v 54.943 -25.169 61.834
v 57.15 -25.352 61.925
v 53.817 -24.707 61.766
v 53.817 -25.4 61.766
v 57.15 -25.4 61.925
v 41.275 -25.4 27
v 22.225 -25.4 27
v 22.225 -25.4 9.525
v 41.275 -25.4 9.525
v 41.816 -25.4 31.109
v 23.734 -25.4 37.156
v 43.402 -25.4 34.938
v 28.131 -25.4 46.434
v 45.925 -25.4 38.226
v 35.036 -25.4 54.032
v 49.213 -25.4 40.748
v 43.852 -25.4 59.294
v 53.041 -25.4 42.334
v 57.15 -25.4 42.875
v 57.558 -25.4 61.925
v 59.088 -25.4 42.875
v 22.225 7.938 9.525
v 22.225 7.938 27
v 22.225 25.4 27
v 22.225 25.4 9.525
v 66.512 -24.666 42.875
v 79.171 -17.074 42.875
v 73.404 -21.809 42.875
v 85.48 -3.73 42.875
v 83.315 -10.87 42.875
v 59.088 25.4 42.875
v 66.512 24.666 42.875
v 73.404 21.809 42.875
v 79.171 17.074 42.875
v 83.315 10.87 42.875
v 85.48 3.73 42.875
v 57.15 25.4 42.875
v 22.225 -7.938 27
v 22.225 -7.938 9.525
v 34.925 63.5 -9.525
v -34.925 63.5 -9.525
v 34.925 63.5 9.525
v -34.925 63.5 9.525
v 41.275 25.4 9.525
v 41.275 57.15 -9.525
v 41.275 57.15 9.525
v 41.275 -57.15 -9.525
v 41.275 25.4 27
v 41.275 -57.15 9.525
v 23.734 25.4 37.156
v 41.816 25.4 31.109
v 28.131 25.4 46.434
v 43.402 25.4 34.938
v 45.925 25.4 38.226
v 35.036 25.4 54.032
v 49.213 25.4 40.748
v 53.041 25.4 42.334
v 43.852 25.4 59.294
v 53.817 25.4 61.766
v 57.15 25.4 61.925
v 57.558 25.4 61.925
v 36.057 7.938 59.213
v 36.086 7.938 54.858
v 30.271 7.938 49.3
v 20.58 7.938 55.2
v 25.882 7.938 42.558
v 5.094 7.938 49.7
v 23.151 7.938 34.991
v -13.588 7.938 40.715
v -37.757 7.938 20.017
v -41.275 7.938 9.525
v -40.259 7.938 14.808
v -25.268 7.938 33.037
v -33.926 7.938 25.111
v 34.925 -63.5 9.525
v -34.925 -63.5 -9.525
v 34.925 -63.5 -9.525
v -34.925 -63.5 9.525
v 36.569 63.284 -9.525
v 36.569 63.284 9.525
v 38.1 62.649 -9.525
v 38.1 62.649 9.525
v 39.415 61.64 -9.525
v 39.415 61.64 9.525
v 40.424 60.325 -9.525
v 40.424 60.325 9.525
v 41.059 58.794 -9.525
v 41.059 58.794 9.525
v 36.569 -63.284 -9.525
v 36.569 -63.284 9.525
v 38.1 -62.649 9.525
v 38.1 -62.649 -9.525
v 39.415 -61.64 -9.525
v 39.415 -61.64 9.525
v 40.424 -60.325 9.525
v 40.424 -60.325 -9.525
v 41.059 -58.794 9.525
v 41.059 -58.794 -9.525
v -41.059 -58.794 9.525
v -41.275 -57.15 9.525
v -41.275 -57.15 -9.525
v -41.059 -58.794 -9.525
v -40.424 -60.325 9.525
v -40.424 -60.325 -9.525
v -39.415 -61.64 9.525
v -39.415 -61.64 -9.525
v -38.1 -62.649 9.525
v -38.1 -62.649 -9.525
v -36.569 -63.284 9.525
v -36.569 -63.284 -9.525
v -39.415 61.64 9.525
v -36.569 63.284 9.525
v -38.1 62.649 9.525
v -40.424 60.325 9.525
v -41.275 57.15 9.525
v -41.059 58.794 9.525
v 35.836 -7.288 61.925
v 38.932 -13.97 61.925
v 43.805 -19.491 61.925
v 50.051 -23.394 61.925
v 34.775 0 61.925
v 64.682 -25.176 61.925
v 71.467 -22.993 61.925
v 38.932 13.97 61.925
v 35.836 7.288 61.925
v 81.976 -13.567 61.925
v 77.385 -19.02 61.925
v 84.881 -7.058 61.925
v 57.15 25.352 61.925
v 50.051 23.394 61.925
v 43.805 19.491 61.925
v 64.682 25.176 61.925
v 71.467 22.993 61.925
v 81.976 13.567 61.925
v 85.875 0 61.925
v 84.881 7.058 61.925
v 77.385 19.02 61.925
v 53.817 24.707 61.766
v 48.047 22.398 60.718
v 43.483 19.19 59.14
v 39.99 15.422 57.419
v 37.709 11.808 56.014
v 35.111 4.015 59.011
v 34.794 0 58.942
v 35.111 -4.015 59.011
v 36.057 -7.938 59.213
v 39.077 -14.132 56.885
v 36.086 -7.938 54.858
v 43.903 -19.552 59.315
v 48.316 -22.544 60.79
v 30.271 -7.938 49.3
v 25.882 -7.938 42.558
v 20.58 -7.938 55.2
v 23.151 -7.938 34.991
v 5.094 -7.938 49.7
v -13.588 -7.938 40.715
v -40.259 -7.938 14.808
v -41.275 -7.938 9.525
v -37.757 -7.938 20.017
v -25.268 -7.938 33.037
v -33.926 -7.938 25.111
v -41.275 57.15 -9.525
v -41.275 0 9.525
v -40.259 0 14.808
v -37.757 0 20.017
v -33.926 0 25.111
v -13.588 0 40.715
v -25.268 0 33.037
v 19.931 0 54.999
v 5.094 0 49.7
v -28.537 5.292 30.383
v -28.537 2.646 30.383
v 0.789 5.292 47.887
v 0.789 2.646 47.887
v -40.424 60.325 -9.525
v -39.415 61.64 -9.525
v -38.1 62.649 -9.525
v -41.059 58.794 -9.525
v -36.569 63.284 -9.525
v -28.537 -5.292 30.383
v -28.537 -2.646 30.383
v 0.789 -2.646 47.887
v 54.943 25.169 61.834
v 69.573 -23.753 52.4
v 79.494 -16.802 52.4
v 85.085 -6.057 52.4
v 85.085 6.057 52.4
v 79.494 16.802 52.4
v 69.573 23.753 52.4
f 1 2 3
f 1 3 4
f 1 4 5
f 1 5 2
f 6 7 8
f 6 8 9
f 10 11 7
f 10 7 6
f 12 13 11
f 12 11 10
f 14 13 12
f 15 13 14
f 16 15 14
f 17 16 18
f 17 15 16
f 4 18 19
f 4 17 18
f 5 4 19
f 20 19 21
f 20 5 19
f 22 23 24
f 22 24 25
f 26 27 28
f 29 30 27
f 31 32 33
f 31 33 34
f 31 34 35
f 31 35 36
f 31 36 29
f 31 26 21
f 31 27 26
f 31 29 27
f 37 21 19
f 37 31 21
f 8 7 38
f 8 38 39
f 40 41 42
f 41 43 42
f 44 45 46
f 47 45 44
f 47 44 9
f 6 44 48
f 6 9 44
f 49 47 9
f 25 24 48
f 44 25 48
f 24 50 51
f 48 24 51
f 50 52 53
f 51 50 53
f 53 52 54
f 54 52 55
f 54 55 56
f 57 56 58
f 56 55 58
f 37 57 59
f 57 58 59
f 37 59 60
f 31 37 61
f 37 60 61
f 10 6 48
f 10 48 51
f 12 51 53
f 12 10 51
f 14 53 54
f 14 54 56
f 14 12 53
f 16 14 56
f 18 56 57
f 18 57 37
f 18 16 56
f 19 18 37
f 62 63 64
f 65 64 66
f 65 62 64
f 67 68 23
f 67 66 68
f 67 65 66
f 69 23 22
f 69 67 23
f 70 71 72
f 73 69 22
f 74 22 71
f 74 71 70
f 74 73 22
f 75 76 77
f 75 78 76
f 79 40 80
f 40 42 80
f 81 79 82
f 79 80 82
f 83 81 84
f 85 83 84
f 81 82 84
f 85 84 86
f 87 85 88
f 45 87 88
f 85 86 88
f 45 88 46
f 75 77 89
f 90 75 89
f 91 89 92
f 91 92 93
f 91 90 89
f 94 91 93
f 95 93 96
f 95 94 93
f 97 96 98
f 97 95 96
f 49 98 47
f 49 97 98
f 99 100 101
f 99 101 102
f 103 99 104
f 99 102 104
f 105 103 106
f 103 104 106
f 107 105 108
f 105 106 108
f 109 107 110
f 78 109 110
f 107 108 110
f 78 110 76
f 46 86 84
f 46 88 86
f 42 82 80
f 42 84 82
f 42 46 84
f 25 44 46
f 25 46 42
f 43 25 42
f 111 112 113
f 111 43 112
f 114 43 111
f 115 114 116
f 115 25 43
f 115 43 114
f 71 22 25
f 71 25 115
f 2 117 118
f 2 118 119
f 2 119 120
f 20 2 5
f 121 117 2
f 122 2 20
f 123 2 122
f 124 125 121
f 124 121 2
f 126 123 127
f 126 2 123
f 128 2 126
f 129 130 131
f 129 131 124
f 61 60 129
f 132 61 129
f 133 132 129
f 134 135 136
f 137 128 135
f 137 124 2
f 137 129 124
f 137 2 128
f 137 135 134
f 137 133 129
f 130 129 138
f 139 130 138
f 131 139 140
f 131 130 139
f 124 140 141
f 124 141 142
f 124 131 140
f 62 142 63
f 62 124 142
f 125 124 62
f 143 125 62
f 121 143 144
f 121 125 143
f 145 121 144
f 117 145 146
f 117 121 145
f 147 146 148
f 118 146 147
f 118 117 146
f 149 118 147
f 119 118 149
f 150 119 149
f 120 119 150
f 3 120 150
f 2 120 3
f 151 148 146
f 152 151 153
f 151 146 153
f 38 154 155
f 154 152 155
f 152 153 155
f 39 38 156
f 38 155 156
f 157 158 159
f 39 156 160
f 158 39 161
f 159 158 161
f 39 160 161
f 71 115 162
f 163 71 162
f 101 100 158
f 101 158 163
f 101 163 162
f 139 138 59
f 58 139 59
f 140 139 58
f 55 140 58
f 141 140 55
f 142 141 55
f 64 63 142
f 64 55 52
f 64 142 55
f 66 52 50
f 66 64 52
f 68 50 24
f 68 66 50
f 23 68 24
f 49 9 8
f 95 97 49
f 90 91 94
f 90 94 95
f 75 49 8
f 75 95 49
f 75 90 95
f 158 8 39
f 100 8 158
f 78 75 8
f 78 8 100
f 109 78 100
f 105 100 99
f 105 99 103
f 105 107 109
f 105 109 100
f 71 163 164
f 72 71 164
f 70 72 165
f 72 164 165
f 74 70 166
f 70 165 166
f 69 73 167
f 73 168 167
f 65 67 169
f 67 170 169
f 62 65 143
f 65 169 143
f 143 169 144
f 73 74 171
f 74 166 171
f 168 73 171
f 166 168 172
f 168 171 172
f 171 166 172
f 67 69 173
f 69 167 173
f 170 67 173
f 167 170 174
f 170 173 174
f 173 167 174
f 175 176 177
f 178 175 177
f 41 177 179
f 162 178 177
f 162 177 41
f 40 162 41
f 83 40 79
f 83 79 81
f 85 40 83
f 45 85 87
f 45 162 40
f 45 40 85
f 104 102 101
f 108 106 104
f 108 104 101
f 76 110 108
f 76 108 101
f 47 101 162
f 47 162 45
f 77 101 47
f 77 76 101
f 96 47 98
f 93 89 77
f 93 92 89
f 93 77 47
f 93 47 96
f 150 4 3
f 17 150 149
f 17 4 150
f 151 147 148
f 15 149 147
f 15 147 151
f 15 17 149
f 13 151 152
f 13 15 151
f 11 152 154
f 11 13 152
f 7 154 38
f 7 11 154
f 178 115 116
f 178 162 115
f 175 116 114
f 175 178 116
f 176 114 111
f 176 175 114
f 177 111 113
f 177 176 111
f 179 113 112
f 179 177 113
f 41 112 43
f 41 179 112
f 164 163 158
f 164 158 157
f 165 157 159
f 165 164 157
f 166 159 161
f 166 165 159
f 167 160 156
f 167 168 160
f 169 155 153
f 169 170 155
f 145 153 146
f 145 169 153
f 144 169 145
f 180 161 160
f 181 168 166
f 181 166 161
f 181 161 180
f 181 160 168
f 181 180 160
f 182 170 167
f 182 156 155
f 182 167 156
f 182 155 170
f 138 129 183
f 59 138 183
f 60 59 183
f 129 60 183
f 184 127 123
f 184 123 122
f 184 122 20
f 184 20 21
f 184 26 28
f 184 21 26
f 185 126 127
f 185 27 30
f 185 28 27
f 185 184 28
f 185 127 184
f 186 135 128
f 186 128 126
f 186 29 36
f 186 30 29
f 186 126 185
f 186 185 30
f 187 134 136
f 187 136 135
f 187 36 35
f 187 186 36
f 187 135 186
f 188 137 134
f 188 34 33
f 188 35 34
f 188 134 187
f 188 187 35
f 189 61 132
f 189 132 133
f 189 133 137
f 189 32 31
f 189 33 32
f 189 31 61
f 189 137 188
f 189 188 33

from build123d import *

# Parameters (mm, degrees)
F1_DEPTH = 63.5
F2_DEPTH = 25.4
F3_DEPTH = 7.9375
F4_R     = 6.35


with BuildPart() as f1:
    # F0 (on Front) → F1 (new body, symmetric)
    with BuildSketch(Plane.XZ):
        Polygon((-41.275, -9.525), (41.275, -9.525), (41.275, 9.525), (22.225, 9.525), (-41.275, 9.525), align=None)
    extrude(amount=F1_DEPTH, both=True)

    # F0 (on Front) → F2 (join, symmetric)
    with BuildSketch(Plane.XZ):
        with BuildLine():
            Line((22.225, 9.525), (41.275, 9.525))
            Line((41.275, 9.525), (41.275, 27.0002))
            ThreePointArc((41.275, 27.0002), (45.9246798487, 38.2255201513), (57.15, 42.8752))
            Line((57.15, 42.8752), (60.325, 42.8752))
            Line((60.325, 42.8752), (60.325, 61.9252))
            Line((60.325, 61.9252), (57.15, 61.9252))
            add(Edge.make_bspline(
                [(53.8173720822, 61.7658326875), (54.9505591394, 61.8408261866), (56.0622461787, 61.8941638054), (57.15, 61.9252)],
                knots=[108.1113735744, 108.1113735744, 108.1113735744, 108.1113735744, 111.5045361635, 111.5045361635, 111.5045361635, 111.5045361635], degree=3))
            ThreePointArc((53.8173720822, 61.7658326875), (31.3028758367, 50.4881074735), (22.225, 27.0002))
            Line((22.225, 27.0002), (22.225, 9.525))
        make_face()
    extrude(amount=F2_DEPTH, both=True)

    # F0 (on Front) → F3 (join, symmetric)
    with BuildSketch(Plane.XZ):
        with BuildLine():
            add(Edge.make_bspline(
                [(-41.275, 9.525), (-40.218694031, 35.0028870222), (17.7122913335, 59.3764245807), (53.8173720822, 61.7658326875)],
                knots=[0, 0, 0, 0, 108.1113735744, 108.1113735744, 108.1113735744, 108.1113735744], degree=3))
            Line((-41.275, 9.525), (22.225, 9.525))
            Line((22.225, 9.525), (22.225, 27.0002))
            ThreePointArc((22.225, 27.0002), (31.3028758367, 50.4881074735), (53.8173720822, 61.7658326875))
        make_face()
    extrude(amount=F3_DEPTH, both=True)

    # F4
    f4_edges = [f1.edges().sort_by_distance(p)[0] for p in [
        (-41.275, -63.5, 0),
        (41.275, -63.5, 0),
        (41.275, 63.5, 0),
        (-41.275, 63.5, 0),
    ]]
    fillet(f4_edges, radius=F4_R)

    # F0 (on Front) → F5 (revolve)
    with BuildSketch(Plane.XZ):
        Polygon((60.325, 61.9252), (60.325, 42.8752), (85.7551261626, 42.8752), (85.8753103219, 61.9252), align=None)
    revolve(axis=Axis((60.325, 0, 52.3875), (0, 0, 1)))


solid = f1.part
